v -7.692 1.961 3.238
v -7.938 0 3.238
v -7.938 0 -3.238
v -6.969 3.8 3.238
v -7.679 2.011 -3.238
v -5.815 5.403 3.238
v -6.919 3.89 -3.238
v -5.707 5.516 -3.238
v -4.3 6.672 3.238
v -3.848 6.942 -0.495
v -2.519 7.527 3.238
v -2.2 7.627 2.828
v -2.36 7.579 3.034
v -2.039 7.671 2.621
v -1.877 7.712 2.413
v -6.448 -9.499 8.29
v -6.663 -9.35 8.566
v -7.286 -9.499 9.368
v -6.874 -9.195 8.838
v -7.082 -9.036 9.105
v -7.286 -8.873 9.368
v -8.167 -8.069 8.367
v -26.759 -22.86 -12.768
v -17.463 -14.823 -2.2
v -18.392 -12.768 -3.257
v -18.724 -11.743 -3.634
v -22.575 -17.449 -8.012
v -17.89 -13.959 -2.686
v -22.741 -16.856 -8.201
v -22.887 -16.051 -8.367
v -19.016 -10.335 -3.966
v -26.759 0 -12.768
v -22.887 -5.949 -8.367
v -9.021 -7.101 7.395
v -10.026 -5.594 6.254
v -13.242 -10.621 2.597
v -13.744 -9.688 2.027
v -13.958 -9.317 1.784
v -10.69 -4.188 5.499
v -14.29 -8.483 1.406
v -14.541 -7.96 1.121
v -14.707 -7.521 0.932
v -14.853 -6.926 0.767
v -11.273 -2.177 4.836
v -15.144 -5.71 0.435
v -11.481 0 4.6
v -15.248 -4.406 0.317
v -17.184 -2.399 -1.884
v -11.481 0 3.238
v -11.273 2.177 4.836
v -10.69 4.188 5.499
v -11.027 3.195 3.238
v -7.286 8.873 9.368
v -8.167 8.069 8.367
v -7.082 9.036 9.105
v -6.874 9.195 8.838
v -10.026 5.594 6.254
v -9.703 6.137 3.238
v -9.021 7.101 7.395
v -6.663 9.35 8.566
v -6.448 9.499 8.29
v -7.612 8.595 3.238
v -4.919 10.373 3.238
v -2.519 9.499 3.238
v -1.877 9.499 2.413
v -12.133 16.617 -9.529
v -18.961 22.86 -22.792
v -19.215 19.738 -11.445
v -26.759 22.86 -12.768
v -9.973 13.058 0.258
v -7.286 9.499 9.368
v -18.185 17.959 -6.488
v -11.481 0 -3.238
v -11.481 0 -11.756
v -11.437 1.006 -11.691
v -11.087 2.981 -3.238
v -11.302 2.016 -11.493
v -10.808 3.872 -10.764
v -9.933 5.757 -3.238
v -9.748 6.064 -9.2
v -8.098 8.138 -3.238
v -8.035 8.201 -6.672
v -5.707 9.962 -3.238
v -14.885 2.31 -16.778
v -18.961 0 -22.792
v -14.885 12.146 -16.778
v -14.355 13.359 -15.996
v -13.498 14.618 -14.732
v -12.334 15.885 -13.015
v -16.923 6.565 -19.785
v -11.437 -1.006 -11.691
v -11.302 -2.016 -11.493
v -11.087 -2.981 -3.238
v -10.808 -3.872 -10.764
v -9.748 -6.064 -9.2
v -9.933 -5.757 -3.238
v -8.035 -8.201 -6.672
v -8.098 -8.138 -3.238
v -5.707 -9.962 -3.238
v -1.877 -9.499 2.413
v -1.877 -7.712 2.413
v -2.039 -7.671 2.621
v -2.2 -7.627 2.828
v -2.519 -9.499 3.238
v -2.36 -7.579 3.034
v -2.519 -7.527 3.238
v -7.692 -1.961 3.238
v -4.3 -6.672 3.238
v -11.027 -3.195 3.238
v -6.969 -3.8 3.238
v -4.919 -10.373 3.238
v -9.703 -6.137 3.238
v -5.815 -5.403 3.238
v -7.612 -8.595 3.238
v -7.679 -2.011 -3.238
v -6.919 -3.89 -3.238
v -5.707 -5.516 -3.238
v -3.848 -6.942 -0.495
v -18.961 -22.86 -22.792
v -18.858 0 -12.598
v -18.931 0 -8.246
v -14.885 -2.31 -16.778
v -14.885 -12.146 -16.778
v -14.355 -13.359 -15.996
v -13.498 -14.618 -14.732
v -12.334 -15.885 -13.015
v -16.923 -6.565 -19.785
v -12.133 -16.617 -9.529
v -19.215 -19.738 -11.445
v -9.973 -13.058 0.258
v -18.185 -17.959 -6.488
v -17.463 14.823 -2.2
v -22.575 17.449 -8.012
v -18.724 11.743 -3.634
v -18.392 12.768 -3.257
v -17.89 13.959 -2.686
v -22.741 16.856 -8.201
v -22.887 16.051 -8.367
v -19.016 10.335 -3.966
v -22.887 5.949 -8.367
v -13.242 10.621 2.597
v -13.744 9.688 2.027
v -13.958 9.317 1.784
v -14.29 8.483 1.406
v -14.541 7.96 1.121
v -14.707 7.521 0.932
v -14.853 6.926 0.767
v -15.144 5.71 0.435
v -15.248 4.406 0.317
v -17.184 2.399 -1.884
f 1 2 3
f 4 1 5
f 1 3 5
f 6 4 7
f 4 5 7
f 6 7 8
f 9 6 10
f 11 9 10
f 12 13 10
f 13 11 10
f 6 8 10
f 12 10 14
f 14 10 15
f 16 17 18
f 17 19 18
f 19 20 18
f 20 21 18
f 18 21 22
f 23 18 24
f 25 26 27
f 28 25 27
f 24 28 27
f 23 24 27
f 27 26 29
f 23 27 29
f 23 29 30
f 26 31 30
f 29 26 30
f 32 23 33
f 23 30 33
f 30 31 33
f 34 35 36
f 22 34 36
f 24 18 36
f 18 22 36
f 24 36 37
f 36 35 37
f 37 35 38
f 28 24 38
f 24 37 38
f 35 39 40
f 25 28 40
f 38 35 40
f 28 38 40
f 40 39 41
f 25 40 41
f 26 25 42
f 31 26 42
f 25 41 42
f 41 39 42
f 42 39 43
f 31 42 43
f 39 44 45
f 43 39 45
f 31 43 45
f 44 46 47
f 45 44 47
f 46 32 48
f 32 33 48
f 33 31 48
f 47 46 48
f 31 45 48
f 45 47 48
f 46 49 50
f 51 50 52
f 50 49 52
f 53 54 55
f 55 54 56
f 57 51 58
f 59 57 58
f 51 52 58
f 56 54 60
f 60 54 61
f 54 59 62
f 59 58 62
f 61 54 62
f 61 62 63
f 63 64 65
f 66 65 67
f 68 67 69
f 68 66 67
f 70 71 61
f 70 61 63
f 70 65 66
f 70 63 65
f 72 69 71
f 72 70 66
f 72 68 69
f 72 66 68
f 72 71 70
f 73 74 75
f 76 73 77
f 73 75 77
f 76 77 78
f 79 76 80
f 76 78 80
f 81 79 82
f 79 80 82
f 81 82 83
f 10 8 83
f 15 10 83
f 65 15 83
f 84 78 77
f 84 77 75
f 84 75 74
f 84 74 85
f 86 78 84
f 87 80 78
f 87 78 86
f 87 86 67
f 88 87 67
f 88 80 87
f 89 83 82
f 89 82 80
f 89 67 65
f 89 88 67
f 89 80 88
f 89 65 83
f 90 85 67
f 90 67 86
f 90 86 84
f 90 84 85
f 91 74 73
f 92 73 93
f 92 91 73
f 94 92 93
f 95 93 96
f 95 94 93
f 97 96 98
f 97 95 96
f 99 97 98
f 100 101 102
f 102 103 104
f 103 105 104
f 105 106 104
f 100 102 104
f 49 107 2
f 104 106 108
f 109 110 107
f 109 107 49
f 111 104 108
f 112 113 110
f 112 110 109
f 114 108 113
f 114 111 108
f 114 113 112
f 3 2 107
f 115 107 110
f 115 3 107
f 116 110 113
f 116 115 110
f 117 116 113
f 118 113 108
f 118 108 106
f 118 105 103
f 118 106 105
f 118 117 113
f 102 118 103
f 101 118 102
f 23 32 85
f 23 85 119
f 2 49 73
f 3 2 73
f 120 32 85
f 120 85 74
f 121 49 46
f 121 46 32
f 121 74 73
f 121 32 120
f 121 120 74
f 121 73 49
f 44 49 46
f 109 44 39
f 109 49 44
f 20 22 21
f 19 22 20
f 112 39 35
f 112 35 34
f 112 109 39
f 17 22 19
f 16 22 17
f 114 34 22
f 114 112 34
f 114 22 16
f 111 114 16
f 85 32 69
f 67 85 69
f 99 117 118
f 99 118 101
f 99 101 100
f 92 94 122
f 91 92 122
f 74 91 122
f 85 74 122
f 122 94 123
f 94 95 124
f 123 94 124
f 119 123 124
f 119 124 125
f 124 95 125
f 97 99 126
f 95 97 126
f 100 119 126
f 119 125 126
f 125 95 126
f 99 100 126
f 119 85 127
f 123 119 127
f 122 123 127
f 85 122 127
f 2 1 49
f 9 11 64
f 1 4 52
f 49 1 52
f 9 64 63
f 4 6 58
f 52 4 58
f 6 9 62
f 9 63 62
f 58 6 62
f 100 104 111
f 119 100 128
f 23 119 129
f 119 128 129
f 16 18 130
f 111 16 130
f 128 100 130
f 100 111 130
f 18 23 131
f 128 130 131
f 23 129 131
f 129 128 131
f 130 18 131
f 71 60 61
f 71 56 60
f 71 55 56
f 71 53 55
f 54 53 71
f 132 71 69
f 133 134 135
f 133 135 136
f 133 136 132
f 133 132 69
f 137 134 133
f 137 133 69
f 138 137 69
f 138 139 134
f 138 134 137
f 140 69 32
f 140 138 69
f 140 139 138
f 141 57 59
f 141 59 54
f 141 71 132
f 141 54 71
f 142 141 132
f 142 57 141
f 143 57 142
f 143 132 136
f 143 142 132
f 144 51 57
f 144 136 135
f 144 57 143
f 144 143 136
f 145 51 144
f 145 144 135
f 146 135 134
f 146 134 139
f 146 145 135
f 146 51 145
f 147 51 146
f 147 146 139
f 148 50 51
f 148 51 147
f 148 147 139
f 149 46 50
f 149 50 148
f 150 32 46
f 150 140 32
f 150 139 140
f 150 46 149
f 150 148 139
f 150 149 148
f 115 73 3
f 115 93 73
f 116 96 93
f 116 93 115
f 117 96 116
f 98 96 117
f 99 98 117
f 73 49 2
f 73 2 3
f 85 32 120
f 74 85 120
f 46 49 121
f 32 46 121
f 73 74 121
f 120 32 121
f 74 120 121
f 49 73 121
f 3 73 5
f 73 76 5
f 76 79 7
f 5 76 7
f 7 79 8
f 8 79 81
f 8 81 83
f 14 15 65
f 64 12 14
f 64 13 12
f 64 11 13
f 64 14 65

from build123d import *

# Parameters (mm, degrees)
F7_W = 22.86
F7_H = 12.7
F9_W = 9.4991559163
F9_H = 8.810961619


# Not quite as in the source:
# - a feature names something its author has since deleted; it is built from what else it names
# - the program builds the solid bodies; features that only make, move or delete a surface that nothing else refers to are left out


with BuildPart() as f10:
    # F7 (on line) → F10 section 0
    with BuildSketch(Plane(origin=(-22.86, 0, -17.78), x_dir=(0, -1, 0), z_dir=(-0.7893522174, 0, -0.6139406135))):
        with Locations((11.43, 0)):
            Rectangle(F7_W, F7_H)
    # F9 (on line) → F10 section 1
    with BuildSketch(Plane(origin=(0, 0, 0), x_dir=(0, -1, 0), z_dir=(-0.7893522174, 0, -0.6139406135))):
        with Locations((4.7495779581, 7.4622994289)):
            Rectangle(F9_W, F9_H)
    loft()

    # F11 (on Front) → F12 (revolve, cut)
    with BuildSketch(Plane.XZ):
        Polygon((-11.4808, 13.2924560457), (-11.4808, 4.7625), (-11.4808, 3.2385), (-7.9375, 3.2385), (-7.9375, -3.2385), (-11.4808, -3.2385), (-11.4808, -4.7625), (-11.4808, -25.4), (0, -25.4), (0, 0), (0, 13.2924560457), align=None)
    revolve(axis=Axis((0, 0, -12.7), (0, 0, 1)), mode=Mode.SUBTRACT)


with BuildPart() as f13_1:
    # F13: instance of F10
    add(f10.part.mirror(Plane.XZ))


solid = Compound([f10.part, f13_1.part])
